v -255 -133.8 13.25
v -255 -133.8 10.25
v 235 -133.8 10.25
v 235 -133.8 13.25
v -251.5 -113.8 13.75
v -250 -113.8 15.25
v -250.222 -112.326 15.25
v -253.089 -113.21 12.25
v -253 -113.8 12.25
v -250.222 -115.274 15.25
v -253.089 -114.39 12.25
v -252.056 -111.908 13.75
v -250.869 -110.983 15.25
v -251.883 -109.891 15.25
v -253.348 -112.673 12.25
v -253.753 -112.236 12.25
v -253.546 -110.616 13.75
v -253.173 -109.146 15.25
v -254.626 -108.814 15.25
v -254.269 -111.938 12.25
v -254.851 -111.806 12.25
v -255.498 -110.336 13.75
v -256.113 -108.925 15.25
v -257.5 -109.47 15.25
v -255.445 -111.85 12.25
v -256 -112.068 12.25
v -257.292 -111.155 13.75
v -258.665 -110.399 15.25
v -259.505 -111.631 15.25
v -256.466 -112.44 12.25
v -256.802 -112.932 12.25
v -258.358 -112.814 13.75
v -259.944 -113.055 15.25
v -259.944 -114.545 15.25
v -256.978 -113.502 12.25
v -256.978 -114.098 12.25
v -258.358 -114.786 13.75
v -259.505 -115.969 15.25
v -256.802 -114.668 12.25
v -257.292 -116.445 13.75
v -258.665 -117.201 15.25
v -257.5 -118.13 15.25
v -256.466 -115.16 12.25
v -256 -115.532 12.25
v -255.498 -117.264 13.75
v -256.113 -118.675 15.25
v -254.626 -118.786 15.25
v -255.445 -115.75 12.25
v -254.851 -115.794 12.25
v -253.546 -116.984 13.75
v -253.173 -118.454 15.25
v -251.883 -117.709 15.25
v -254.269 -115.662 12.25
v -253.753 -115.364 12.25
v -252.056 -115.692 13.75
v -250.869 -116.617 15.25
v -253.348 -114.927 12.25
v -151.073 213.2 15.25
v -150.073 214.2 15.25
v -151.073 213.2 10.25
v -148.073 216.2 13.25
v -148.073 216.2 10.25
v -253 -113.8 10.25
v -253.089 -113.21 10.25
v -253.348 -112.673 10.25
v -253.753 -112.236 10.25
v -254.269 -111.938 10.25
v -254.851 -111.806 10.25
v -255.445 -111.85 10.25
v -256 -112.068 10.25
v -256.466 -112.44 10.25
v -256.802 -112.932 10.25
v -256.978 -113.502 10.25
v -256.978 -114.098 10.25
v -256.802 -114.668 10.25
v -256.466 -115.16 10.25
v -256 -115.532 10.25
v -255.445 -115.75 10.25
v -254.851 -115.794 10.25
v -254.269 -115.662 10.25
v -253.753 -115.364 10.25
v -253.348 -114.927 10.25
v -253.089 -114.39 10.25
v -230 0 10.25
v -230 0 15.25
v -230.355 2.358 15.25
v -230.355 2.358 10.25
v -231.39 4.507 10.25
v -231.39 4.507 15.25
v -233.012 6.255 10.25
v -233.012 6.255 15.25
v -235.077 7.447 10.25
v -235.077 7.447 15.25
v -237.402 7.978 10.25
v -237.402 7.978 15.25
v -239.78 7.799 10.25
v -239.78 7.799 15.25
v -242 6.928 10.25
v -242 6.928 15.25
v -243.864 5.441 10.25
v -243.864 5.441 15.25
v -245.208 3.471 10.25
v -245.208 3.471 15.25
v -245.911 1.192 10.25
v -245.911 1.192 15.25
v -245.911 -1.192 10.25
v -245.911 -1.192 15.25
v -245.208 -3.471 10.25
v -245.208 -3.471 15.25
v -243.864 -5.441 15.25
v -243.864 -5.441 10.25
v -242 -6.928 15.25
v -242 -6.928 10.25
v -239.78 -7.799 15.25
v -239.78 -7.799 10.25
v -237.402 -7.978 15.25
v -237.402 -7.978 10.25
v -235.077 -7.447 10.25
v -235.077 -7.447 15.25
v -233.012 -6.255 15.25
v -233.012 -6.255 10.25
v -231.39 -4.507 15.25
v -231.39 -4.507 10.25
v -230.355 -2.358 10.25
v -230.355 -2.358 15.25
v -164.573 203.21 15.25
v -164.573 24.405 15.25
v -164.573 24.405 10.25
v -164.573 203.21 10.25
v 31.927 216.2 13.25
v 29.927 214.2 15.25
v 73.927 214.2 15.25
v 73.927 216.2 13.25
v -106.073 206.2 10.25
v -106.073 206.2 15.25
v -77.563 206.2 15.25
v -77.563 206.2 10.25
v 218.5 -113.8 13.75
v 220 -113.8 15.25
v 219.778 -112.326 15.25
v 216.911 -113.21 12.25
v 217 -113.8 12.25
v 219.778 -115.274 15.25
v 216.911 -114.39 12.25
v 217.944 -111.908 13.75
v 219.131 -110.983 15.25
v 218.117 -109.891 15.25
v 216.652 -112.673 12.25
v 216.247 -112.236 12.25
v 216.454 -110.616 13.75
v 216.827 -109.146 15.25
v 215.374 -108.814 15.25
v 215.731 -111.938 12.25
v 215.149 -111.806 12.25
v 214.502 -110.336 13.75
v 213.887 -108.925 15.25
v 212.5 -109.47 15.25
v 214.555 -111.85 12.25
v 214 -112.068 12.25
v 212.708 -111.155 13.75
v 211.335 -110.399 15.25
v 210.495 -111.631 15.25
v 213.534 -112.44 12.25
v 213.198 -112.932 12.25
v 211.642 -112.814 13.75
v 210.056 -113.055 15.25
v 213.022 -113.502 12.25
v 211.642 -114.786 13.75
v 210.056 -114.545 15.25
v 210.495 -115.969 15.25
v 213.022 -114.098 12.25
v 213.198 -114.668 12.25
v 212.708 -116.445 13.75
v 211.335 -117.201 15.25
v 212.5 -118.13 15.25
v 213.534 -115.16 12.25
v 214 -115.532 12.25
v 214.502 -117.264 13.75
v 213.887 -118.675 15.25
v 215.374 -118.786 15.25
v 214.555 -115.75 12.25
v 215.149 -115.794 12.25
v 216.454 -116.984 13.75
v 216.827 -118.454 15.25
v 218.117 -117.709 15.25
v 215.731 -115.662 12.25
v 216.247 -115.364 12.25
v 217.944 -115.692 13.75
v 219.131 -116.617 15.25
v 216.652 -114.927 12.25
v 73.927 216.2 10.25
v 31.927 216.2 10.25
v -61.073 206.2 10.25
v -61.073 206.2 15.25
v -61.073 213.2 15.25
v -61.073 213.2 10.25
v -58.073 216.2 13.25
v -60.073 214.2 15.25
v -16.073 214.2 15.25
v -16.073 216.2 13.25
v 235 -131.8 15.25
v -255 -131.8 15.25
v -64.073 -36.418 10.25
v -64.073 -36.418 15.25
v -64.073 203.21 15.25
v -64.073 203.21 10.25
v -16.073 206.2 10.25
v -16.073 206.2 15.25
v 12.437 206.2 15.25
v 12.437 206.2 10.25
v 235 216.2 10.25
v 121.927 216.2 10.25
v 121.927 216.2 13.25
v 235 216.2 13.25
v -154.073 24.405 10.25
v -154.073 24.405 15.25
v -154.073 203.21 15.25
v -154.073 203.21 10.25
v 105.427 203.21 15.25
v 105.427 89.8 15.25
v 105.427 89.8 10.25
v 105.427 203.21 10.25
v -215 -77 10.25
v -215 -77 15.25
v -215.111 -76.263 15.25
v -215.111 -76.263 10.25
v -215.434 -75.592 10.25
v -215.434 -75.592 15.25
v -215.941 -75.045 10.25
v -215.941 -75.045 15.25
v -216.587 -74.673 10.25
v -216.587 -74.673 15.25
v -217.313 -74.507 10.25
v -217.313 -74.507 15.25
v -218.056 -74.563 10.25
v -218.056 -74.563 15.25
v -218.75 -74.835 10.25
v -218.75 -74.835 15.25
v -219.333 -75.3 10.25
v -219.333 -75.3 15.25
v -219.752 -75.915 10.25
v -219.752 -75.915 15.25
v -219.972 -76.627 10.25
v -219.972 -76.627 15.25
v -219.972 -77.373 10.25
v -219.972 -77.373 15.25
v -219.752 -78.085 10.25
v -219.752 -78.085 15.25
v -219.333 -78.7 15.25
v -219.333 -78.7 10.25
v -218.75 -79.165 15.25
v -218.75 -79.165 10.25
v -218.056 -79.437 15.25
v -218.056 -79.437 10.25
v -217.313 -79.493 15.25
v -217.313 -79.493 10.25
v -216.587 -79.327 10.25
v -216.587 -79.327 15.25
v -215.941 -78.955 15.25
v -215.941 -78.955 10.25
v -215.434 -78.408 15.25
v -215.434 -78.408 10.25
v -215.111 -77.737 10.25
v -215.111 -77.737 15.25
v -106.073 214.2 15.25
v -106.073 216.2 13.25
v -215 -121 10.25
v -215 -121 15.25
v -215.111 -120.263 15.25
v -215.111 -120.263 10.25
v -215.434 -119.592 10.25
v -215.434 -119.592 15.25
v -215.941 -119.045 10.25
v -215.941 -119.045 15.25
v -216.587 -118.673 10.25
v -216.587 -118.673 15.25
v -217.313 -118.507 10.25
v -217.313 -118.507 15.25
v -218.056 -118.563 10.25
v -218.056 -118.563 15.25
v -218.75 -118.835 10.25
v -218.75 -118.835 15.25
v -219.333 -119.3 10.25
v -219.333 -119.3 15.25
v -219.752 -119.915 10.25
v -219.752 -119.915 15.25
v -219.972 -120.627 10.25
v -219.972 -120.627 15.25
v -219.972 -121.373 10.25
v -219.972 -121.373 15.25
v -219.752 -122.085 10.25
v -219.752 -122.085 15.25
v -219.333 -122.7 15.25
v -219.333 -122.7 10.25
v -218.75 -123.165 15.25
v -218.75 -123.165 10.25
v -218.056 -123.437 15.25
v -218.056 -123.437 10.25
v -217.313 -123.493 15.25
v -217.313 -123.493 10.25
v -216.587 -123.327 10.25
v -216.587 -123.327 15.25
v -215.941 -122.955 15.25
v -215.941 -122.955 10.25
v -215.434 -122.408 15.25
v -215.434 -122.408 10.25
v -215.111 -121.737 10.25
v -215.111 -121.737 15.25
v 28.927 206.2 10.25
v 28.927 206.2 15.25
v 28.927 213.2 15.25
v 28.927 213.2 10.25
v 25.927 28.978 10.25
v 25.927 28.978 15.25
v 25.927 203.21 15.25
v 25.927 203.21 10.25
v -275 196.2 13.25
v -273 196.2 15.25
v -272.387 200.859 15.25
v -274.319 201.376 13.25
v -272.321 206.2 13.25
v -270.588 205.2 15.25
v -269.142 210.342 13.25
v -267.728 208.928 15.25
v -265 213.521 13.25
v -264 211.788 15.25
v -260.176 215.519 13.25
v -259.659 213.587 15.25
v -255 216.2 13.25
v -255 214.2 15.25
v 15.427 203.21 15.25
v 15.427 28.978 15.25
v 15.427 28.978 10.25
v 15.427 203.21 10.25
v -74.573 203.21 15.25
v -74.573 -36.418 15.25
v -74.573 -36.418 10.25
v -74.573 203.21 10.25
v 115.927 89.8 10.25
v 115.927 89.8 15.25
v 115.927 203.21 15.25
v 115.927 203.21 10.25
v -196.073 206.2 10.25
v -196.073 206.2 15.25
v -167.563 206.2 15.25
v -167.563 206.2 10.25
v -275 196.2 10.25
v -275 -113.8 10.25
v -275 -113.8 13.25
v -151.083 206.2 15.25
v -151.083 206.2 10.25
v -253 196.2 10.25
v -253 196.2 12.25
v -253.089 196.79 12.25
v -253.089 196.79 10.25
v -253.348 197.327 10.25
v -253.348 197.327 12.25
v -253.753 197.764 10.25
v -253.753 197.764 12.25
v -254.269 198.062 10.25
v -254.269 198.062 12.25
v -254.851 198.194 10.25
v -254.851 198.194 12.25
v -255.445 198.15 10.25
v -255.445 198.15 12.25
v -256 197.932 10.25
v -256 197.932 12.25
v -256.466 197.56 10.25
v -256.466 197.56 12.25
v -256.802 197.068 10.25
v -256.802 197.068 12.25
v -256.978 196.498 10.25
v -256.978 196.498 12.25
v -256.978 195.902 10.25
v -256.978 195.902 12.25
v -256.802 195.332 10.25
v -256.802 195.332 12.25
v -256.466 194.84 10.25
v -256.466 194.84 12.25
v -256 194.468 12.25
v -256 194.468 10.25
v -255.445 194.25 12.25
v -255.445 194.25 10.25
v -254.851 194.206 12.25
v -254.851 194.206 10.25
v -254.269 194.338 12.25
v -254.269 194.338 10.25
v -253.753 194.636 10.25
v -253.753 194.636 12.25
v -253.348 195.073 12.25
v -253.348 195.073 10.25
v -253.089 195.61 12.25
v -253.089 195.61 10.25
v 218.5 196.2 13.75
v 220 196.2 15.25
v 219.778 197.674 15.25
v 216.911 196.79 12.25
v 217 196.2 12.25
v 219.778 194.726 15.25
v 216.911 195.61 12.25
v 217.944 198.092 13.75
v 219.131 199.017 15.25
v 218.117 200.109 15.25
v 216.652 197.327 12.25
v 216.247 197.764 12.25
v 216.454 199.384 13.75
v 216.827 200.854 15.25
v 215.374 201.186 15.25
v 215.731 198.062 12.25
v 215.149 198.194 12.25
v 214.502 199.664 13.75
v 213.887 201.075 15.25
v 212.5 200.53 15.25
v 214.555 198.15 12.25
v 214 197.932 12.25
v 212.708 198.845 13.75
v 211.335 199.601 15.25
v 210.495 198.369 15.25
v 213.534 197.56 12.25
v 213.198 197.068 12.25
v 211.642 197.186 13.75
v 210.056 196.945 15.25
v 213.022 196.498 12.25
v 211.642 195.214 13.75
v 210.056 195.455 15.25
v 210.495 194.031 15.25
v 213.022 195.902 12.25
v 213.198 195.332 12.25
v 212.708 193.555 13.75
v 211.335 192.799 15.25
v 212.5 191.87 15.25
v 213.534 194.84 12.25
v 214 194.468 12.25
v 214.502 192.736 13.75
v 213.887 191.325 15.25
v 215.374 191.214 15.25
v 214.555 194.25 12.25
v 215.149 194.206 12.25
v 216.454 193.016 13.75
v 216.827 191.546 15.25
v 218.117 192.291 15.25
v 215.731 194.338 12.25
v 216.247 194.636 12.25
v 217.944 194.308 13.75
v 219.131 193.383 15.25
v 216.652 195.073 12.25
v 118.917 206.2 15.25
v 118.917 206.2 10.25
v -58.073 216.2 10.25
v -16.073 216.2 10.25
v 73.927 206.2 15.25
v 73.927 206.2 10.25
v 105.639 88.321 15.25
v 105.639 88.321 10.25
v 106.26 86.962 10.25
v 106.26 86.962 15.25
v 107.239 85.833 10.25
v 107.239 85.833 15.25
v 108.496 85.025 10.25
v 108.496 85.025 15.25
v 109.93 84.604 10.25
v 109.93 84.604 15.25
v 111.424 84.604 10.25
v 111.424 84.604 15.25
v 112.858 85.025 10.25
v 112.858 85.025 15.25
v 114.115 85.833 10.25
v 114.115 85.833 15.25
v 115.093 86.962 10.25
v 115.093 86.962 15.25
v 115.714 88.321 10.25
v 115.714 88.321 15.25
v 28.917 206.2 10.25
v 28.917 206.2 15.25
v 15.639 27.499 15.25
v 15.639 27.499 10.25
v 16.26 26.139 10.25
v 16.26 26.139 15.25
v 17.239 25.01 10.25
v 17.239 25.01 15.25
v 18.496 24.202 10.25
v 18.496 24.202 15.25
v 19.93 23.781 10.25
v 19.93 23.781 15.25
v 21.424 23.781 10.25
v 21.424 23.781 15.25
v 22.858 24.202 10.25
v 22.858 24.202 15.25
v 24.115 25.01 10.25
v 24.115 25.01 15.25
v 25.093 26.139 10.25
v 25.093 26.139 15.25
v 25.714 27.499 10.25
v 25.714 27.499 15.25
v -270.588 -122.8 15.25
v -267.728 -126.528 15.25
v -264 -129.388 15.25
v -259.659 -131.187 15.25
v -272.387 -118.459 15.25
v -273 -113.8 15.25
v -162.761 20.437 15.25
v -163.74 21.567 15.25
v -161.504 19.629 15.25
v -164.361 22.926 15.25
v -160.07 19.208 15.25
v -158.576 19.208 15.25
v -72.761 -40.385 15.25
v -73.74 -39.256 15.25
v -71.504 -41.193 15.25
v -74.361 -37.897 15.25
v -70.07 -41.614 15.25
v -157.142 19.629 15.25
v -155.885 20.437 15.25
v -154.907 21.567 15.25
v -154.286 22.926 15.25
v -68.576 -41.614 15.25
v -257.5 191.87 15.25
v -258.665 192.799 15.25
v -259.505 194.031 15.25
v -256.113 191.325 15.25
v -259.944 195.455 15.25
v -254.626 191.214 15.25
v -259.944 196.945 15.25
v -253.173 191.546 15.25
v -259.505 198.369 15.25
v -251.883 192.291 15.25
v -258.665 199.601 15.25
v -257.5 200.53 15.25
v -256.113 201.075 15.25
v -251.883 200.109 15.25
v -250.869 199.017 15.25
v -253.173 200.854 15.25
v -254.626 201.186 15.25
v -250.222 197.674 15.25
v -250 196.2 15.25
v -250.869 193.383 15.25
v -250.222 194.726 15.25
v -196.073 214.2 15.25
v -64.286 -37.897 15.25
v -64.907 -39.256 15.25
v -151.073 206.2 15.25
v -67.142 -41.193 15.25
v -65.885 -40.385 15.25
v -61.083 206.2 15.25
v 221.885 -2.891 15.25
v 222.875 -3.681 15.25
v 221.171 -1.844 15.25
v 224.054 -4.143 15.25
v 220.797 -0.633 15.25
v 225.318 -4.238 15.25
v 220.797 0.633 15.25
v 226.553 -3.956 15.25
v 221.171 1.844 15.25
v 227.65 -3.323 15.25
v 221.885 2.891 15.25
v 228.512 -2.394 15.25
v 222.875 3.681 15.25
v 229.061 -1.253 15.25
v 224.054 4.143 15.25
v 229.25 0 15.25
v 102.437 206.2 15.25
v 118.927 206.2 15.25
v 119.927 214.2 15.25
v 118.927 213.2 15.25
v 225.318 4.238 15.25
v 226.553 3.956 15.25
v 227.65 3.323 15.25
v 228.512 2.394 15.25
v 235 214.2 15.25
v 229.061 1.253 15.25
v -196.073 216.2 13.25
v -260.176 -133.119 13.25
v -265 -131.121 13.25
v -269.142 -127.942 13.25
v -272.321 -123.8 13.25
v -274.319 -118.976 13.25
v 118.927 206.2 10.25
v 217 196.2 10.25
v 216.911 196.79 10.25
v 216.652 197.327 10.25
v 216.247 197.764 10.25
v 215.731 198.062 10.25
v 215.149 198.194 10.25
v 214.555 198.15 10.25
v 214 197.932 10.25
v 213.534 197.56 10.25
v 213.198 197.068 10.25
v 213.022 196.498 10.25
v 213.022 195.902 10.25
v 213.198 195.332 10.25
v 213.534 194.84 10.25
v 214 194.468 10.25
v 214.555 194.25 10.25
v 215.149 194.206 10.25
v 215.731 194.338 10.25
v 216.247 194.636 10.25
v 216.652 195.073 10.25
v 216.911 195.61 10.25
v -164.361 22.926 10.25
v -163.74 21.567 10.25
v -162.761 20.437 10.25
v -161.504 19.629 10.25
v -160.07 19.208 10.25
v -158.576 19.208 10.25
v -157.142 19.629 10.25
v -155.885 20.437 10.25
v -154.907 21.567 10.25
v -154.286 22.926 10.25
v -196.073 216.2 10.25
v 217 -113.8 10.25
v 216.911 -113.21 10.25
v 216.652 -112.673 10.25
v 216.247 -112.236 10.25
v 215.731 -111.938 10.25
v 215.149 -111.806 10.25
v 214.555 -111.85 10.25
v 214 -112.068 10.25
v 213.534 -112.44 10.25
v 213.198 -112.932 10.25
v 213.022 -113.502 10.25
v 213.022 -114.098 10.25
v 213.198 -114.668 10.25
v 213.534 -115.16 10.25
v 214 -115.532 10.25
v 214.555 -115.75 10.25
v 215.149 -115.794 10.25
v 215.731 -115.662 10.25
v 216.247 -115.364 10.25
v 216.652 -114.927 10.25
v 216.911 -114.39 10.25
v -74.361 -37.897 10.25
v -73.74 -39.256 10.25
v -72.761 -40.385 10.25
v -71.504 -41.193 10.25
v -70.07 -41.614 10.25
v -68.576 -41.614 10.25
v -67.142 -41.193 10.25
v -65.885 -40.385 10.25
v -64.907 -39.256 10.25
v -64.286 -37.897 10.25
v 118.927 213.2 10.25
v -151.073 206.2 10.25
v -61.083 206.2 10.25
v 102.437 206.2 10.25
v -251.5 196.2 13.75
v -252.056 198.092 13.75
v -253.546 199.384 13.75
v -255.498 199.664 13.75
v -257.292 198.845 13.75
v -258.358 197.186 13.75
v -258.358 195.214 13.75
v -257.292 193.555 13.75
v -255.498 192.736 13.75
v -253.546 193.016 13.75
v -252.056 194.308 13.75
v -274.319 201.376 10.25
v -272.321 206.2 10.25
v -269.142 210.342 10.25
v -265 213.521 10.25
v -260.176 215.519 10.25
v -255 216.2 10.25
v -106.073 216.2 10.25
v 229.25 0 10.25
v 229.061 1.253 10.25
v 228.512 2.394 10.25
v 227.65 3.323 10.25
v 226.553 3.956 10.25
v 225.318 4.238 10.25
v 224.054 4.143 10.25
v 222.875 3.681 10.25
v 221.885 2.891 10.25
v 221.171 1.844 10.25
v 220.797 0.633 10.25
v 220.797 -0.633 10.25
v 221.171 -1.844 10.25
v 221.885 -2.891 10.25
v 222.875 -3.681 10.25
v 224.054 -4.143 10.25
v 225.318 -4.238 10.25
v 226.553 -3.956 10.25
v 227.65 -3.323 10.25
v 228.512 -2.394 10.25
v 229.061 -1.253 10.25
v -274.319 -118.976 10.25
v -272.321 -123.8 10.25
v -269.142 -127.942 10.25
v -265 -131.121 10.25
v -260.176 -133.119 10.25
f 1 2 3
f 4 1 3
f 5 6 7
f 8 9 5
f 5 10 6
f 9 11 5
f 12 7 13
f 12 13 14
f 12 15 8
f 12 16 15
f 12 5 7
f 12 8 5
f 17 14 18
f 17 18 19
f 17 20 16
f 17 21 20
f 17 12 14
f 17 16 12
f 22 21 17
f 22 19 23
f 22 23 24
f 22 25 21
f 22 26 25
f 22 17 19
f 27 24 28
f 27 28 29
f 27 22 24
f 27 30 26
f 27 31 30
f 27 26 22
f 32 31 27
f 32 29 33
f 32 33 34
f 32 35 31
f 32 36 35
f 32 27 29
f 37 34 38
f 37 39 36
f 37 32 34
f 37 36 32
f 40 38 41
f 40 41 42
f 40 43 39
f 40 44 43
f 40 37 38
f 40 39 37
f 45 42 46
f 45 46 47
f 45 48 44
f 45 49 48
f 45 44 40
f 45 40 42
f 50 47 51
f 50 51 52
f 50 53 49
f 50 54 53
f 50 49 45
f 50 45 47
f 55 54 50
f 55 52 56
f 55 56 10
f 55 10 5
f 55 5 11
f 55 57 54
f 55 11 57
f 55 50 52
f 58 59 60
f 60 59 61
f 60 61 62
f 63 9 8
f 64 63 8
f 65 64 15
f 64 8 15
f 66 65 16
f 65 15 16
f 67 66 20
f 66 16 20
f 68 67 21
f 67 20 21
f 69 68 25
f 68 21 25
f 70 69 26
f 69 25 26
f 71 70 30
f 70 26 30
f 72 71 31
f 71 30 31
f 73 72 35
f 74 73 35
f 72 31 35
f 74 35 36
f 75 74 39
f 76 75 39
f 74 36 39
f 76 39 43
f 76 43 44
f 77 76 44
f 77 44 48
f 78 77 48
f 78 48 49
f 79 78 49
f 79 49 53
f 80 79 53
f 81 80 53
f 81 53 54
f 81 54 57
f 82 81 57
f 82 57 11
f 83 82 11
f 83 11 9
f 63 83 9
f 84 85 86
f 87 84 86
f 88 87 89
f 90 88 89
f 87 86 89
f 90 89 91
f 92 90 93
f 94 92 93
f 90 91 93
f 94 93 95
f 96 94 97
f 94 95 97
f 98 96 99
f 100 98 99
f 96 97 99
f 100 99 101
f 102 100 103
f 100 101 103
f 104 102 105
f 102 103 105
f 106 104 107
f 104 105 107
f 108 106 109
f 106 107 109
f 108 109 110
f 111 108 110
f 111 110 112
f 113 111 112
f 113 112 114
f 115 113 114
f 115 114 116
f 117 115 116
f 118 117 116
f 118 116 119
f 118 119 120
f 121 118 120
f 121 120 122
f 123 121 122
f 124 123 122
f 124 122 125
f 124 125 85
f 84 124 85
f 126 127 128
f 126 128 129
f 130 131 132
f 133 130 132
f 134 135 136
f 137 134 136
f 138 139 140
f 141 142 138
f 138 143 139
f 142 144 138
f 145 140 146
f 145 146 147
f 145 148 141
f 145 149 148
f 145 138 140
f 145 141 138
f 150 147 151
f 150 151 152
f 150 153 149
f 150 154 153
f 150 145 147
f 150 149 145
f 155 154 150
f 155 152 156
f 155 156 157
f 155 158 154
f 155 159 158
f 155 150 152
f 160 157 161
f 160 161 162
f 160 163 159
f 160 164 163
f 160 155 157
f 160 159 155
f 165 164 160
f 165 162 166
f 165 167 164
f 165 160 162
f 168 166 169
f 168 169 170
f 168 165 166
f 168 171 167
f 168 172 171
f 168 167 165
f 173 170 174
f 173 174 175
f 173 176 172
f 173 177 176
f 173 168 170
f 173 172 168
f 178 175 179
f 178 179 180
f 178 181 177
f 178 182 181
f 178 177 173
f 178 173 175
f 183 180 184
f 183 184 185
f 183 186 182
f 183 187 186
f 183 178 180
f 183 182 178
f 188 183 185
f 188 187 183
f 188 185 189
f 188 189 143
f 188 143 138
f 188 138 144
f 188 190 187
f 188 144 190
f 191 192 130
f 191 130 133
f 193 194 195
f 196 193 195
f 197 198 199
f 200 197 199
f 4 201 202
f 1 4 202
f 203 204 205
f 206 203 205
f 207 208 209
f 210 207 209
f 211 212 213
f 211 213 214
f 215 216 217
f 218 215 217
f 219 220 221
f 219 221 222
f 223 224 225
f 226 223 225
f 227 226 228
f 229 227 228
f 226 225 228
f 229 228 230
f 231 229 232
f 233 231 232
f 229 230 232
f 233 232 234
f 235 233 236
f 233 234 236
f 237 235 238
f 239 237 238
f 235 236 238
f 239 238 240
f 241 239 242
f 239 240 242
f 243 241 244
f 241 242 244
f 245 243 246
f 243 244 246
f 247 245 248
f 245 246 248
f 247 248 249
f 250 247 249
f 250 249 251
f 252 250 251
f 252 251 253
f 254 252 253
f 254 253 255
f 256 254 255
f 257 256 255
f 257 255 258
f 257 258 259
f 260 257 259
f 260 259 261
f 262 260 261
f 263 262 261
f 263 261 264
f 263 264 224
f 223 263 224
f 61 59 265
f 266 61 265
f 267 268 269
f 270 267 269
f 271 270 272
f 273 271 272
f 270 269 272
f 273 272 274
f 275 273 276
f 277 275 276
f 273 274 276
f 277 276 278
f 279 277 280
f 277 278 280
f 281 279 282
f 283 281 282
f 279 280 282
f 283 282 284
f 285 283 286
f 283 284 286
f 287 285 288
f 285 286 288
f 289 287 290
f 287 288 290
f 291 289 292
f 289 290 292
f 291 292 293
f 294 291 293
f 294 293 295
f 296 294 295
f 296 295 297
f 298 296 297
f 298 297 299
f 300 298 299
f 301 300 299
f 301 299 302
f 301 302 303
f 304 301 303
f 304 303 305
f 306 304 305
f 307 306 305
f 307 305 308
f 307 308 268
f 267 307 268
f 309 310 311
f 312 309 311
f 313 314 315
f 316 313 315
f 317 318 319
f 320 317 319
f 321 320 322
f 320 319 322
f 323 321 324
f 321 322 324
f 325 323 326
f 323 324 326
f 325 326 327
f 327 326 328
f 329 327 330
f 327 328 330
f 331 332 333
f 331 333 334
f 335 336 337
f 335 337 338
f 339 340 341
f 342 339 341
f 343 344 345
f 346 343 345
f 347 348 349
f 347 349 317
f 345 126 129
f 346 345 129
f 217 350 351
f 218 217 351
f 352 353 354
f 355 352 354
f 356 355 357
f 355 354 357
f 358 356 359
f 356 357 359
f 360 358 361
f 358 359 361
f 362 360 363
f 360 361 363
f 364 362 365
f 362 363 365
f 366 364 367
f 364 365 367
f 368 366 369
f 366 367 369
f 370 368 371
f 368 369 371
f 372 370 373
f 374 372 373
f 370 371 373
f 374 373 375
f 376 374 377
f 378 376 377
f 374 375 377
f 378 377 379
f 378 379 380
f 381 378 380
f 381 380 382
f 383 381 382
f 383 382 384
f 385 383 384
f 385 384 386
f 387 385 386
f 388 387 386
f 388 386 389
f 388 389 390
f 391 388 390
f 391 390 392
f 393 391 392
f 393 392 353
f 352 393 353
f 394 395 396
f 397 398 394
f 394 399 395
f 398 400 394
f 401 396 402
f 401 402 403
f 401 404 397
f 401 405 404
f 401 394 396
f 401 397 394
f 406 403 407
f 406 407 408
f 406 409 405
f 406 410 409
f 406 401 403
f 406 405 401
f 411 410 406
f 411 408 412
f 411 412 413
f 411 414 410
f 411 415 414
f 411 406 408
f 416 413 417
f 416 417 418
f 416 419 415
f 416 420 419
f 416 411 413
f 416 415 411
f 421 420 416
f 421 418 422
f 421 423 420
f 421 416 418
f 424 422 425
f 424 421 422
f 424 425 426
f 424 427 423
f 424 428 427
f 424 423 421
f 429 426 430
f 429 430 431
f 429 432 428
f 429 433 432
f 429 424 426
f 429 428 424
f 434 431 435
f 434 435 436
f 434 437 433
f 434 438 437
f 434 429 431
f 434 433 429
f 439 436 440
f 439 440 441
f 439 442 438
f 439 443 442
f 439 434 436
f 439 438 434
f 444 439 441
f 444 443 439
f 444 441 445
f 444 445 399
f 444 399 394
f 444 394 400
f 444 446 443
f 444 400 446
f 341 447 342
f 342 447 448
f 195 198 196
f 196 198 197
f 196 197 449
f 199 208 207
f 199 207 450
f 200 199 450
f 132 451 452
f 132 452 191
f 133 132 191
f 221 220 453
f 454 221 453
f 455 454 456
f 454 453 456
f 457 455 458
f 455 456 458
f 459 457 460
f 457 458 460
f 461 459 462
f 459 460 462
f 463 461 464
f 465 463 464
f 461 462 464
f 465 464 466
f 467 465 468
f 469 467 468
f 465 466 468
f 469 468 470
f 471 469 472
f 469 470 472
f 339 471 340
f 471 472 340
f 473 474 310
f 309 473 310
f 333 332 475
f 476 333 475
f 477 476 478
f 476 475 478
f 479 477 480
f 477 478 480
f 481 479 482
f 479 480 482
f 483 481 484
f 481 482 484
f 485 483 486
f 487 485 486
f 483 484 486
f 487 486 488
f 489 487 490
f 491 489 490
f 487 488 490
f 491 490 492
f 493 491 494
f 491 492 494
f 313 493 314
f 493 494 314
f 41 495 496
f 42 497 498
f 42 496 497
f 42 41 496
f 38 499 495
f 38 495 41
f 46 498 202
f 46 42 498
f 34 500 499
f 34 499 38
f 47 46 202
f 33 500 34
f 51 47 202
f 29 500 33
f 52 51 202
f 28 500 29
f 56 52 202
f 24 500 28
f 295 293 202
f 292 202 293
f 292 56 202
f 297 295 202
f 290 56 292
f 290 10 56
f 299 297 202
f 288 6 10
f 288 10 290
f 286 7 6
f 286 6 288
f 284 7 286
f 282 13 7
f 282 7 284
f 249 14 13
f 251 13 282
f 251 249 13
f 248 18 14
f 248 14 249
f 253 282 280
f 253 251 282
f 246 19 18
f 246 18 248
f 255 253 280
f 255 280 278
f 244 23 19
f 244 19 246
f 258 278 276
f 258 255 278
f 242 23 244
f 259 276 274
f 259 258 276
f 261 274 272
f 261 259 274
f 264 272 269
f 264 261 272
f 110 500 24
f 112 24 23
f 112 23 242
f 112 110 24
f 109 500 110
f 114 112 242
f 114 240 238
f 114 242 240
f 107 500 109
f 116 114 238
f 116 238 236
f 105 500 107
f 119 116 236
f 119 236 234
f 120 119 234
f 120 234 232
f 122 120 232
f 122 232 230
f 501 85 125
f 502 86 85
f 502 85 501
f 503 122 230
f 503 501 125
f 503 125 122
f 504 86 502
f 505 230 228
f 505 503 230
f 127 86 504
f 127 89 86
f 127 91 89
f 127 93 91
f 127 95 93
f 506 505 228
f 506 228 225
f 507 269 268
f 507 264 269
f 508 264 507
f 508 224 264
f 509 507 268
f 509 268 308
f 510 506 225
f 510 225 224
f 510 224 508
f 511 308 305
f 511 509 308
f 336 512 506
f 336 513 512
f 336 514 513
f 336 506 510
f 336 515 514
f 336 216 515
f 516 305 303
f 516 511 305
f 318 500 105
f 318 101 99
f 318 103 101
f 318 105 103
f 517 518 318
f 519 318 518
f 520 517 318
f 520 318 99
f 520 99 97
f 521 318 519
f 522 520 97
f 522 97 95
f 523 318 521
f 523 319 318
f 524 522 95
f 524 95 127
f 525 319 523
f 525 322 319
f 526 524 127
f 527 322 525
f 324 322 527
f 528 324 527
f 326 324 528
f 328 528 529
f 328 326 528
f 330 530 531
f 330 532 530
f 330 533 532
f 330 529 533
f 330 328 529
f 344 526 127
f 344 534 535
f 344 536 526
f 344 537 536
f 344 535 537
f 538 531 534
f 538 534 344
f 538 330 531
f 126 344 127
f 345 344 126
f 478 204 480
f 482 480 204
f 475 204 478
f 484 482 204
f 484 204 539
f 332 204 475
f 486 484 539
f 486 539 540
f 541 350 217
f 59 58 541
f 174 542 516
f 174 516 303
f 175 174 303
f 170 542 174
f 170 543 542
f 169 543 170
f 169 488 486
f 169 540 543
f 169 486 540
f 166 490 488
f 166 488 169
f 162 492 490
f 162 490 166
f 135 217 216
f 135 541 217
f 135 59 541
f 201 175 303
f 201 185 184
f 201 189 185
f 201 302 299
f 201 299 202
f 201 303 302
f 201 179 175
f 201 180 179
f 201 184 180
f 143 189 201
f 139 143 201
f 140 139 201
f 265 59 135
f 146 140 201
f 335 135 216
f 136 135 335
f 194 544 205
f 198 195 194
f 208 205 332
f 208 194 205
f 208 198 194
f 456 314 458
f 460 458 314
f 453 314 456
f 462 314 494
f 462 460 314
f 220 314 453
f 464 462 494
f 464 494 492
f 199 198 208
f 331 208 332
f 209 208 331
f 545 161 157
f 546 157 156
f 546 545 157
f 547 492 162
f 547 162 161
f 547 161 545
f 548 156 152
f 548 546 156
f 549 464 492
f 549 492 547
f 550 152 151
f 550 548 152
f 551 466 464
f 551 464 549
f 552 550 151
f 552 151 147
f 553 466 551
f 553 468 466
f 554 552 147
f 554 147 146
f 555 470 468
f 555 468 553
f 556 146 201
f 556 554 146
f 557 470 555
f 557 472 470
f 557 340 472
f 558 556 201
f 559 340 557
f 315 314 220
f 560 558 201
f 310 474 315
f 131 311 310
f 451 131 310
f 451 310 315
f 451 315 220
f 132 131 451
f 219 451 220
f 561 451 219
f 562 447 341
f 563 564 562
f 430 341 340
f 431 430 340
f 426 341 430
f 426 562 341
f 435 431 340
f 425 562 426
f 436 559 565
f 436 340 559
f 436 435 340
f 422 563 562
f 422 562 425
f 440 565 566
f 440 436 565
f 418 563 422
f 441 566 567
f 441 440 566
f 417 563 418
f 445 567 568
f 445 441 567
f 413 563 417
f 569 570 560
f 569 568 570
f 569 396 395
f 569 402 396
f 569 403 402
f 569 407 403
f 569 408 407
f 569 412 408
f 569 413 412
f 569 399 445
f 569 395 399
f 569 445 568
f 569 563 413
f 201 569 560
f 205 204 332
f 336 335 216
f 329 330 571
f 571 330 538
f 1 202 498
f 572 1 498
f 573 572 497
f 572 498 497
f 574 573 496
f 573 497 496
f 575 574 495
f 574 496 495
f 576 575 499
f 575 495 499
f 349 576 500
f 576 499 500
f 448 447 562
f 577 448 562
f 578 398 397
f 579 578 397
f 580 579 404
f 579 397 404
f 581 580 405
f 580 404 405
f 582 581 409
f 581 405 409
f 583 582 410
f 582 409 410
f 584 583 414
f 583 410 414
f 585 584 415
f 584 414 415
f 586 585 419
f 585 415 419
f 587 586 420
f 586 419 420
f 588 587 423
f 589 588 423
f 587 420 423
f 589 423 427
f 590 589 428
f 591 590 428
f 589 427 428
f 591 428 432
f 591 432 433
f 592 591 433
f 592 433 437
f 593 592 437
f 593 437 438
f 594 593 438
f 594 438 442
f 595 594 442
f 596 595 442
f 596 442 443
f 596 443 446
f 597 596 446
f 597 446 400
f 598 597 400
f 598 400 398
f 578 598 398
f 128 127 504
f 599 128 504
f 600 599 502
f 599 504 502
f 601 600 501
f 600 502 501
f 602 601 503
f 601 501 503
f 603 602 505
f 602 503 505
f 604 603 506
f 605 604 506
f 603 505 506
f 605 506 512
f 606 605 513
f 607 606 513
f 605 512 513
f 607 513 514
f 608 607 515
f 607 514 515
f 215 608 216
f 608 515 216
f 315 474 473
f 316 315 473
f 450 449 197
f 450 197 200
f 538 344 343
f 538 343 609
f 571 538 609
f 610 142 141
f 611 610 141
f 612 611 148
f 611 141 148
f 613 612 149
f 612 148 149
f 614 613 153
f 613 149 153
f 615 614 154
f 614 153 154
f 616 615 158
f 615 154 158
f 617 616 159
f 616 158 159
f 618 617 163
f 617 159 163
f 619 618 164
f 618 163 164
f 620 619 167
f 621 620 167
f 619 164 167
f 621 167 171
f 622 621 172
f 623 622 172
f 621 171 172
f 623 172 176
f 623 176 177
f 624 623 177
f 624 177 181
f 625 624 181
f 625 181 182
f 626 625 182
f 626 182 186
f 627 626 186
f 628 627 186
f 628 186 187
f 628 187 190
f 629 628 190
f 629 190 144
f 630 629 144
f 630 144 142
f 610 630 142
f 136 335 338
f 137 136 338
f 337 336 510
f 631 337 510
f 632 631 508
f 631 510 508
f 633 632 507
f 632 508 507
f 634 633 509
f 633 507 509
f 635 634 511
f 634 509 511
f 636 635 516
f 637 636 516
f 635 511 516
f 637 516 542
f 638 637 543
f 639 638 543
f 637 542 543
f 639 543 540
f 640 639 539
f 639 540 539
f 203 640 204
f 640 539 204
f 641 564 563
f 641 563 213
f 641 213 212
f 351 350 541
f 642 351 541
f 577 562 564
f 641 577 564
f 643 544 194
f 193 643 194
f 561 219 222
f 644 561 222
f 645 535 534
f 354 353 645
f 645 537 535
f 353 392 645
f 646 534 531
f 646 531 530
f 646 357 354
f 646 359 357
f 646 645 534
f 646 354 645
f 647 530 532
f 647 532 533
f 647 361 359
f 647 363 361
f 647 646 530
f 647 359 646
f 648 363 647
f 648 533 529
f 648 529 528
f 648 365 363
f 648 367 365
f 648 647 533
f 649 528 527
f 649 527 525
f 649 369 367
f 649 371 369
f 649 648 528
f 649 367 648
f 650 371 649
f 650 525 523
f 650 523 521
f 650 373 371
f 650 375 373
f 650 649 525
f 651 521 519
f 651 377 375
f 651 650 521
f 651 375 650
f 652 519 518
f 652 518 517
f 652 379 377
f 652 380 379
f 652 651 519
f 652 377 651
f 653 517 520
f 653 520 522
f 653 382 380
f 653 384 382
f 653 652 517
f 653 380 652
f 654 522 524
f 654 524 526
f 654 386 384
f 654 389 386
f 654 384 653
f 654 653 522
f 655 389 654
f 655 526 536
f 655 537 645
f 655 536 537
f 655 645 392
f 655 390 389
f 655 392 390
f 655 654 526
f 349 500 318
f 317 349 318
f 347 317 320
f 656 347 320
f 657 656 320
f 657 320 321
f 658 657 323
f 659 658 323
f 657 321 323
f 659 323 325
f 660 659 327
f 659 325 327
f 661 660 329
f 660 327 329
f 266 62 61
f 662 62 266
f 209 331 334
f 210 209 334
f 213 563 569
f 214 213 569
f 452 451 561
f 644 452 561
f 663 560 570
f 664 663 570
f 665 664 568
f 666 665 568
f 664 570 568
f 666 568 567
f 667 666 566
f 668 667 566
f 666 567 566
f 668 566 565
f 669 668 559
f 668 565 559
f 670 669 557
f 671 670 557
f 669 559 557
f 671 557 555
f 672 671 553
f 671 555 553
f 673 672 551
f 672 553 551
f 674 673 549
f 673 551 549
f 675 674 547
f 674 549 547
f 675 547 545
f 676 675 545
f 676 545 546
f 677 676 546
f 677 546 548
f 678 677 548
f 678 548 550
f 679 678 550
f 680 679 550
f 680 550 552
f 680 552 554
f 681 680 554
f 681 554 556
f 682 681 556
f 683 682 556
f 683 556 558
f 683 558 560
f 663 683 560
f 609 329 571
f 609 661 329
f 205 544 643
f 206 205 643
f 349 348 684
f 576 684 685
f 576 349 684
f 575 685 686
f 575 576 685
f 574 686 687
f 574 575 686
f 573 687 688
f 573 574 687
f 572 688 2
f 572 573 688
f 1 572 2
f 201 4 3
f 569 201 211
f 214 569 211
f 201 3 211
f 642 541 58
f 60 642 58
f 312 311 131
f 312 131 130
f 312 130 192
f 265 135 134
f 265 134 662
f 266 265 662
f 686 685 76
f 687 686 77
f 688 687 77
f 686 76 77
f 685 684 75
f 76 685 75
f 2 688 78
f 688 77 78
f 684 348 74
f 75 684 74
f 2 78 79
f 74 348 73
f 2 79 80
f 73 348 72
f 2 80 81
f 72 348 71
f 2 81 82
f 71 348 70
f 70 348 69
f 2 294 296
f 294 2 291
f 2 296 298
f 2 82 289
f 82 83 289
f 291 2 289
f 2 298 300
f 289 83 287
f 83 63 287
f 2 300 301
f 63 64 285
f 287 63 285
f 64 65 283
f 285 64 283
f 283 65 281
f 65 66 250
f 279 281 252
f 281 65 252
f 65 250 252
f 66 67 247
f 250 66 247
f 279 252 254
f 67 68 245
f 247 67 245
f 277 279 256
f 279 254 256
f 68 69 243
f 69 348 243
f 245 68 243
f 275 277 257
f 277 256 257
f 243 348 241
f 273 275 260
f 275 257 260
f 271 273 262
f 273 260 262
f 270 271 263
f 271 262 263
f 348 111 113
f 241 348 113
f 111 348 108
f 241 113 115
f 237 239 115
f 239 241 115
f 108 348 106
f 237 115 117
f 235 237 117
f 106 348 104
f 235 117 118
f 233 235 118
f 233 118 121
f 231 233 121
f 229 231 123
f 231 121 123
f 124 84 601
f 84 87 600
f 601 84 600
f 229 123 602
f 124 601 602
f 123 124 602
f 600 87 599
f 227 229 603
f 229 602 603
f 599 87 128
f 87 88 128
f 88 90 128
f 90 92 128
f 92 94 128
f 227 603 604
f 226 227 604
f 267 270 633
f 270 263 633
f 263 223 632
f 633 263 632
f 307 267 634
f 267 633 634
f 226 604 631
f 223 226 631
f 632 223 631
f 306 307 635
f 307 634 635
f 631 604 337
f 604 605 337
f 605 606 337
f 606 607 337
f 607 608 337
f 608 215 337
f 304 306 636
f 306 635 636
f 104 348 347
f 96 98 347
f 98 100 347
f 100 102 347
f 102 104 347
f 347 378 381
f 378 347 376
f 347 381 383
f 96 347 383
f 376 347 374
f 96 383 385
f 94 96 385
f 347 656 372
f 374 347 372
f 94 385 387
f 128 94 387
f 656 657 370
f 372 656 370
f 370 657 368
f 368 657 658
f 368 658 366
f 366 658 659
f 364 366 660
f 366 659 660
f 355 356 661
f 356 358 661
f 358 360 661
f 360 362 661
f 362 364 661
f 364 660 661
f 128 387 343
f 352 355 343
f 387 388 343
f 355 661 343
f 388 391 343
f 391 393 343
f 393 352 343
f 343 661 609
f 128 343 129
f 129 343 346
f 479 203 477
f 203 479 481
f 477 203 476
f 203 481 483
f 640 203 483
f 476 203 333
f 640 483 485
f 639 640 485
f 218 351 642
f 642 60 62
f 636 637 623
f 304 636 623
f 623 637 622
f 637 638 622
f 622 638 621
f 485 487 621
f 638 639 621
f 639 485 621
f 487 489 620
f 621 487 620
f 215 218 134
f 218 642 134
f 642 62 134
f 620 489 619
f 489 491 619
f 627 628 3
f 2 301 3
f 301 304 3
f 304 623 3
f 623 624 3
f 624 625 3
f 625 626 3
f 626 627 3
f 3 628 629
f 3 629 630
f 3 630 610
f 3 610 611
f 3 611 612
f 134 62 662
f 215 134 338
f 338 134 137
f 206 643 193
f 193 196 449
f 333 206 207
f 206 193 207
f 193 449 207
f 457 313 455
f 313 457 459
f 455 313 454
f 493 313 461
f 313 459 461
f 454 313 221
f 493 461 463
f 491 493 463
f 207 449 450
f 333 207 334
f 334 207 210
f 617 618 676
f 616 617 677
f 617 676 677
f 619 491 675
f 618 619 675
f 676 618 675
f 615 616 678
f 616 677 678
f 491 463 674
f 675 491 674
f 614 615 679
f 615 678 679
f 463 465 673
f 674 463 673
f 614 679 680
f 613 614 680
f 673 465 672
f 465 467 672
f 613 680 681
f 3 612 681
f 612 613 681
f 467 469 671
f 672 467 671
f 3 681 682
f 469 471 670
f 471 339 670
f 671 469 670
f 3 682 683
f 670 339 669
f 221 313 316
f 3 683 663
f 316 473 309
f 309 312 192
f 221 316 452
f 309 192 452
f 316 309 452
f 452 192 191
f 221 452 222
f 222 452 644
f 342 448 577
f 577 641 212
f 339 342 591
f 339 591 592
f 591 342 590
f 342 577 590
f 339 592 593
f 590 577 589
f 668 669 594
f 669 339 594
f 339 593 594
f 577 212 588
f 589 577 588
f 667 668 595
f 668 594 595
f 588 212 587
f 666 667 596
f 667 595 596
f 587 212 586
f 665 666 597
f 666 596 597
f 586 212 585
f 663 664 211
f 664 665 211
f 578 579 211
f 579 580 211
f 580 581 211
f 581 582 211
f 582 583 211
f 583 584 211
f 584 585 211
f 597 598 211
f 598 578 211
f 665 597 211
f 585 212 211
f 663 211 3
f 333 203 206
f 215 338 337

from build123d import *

# Parameters (mm, degrees)
SKETCH018_W     = 510
SKETCH018_H     = 350
PAD015_DEPTH    = 5
SKETCH019_R     = 8
SKETCH019_R_2   = 4.25
POCKET011_DEPTH = 5.001
FILLET005_R     = 20
SKETCH020_R     = 2
POCKET012_DEPTH = 5.001
CHAMFER009_SIZE = 6
CHAMFER010_SIZE = 2
CHAMFER011_SIZE = 3
SKETCH052_W     = 45
SKETCH052_H     = 10
POCKET033_DEPTH = 5.001
CHAMFER024_SIZE = 2.99
SKETCH068_R     = 2.5
POCKET043_DEPTH = 5.001


with BuildPart() as part:
    # Sketch018 → Pad015 (new body)
    with BuildSketch(Plane.XY):
        with Locations((-20, 41.2)):
            Rectangle(SKETCH018_W, SKETCH018_H)
    extrude(amount=PAD015_DEPTH)

    # Sketch019 (on Face6 of Pad015) → Pocket011 (cut, through all)
    with BuildSketch(Plane.XY.offset(5)):
        with Locations((-238, 0)):
            Circle(SKETCH019_R)
        with Locations((225, 0)):
            Circle(SKETCH019_R_2)
        with BuildLine():
            ThreePointArc((-164.573184, 24.404903), (-159.323184, 19.154903), (-154.073184, 24.404903))
            Line((-154.073184, 24.404903), (-154.073184, 216.2))
            ThreePointArc((-154.073184, 216.2), (-159.323184, 221.45), (-164.573184, 216.2))
            Line((-164.573184, 24.404903), (-164.573184, 216.2))
        make_face()
        with BuildLine():
            ThreePointArc((-74.573184, -36.417713), (-69.323184, -41.667713), (-64.073184, -36.417713))
            Line((-64.073184, -36.417713), (-64.073184, 216.2))
            ThreePointArc((-64.073184, 216.2), (-69.323184, 221.45), (-74.573184, 216.2))
            Line((-74.573184, -36.417713), (-74.573184, 216.2))
        make_face()
        with BuildLine():
            ThreePointArc((15.426816, 28.977719), (20.676816, 23.727719), (25.926816, 28.977719))
            Line((25.926816, 28.977719), (25.926816, 216.2))
            ThreePointArc((25.926816, 216.2), (20.676816, 221.45), (15.426816, 216.2))
            Line((15.426816, 28.977719), (15.426816, 216.2))
        make_face()
        with BuildLine():
            ThreePointArc((105.426816, 89.800335), (110.676816, 84.550335), (115.926816, 89.800335))
            Line((115.926816, 89.800335), (115.926816, 216.2))
            ThreePointArc((115.926816, 216.2), (110.676816, 221.45), (105.426816, 216.2))
            Line((105.426816, 89.800335), (105.426816, 216.2))
        make_face()
    extrude(amount=-POCKET011_DEPTH, mode=Mode.SUBTRACT)

    # Fillet005
    fillet005_edges = [part.edges().sort_by_distance(p)[0] for p in [
        (-275, 216.2, 2.5),
        (-275, -133.8, 2.5),
    ]]
    fillet(fillet005_edges, radius=FILLET005_R)

    # Sketch020 (on Face5 of Fillet005) → Pocket012 (cut, through all)
    with BuildSketch(Plane.XY.offset(5)):
        with Locations((-255, 196.2)):
            Circle(SKETCH020_R)
        with Locations((-255, -113.8)):
            Circle(SKETCH020_R)
        with Locations((215, -113.8)):
            Circle(SKETCH020_R)
        with Locations((215, 196.2)):
            Circle(SKETCH020_R)
    extrude(amount=-POCKET012_DEPTH, mode=Mode.SUBTRACT)

    # Chamfer009
    chamfer009_edges = [part.edges().sort_by_distance(p)[0] for p in [
        (-164.573184, 216.2, 2.5),
        (-154.073184, 216.2, 2.5),
        (-74.573184, 216.2, 2.5),
        (-64.073184, 216.2, 2.5),
        (15.426816, 216.2, 2.5),
        (25.926816, 216.2, 2.5),
        (105.426816, 216.2, 2.5),
        (115.926816, 216.2, 2.5),
    ]]
    chamfer(chamfer009_edges, length=CHAMFER009_SIZE)

    # Chamfer010
    chamfer010_edges = [part.edges().sort_by_distance(p)[0] for p in [
        (-212.786592, 216.2, 5),
        (-114.323184, 216.2, 5),
        (-24.323184, 216.2, 5),
        (65.676816, 216.2, 5),
        (178.463408, 216.2, 5),
    ]]
    chamfer(chamfer010_edges, length=CHAMFER010_SIZE)

    # Chamfer011
    chamfer011_edges = [part.edges().sort_by_distance(p)[0] for p in [
        (-257, 196.2, 5),
        (-257, -113.8, 5),
        (213, -113.8, 5),
        (213, 196.2, 5),
    ]]
    chamfer(chamfer011_edges, length=CHAMFER011_SIZE)

    # Sketch052 (on Face1 of Chamfer011) → Pocket033 (cut, through all)
    with BuildSketch(Plane.XY.offset(5)):
        with Locations((-173.573184, 211.2)):
            Rectangle(SKETCH052_W, SKETCH052_H)
        with Locations((-83.573184, 211.2)):
            Rectangle(SKETCH052_W, SKETCH052_H)
        with Locations((6.426816, 211.2)):
            Rectangle(SKETCH052_W, SKETCH052_H)
        with Locations((96.426816, 211.2)):
            Rectangle(SKETCH052_W, SKETCH052_H)
    extrude(amount=-POCKET033_DEPTH, mode=Mode.SUBTRACT)

    # Chamfer024
    chamfer024_edges = [part.edges().sort_by_distance(p)[0] for p in [
        (-164.573184, 206.2, 2.5),
        (-154.073184, 206.2, 2.5),
        (-74.573184, 206.2, 2.5),
        (-64.073184, 206.2, 2.5),
        (15.426816, 206.2, 2.5),
        (25.926816, 206.2, 2.5),
        (105.426816, 206.2, 2.5),
        (115.926816, 206.2, 2.5),
    ]]
    chamfer(chamfer024_edges, length=CHAMFER024_SIZE)

    # Sketch068 (on Face1 of Chamfer024) → Pocket043 (cut, through all)
    with BuildSketch(Plane.XY.offset(5)):
        with Locations((-217.5, -77)):
            Circle(SKETCH068_R)
        with Locations((-217.5, -121)):
            Circle(SKETCH068_R)
    extrude(amount=-POCKET043_DEPTH, mode=Mode.SUBTRACT)


with BuildPart() as part_1:
    # Body011 placement: moved
    add(part.part.moved(Location((0, 0, 10.25))))


solid = part_1.part
